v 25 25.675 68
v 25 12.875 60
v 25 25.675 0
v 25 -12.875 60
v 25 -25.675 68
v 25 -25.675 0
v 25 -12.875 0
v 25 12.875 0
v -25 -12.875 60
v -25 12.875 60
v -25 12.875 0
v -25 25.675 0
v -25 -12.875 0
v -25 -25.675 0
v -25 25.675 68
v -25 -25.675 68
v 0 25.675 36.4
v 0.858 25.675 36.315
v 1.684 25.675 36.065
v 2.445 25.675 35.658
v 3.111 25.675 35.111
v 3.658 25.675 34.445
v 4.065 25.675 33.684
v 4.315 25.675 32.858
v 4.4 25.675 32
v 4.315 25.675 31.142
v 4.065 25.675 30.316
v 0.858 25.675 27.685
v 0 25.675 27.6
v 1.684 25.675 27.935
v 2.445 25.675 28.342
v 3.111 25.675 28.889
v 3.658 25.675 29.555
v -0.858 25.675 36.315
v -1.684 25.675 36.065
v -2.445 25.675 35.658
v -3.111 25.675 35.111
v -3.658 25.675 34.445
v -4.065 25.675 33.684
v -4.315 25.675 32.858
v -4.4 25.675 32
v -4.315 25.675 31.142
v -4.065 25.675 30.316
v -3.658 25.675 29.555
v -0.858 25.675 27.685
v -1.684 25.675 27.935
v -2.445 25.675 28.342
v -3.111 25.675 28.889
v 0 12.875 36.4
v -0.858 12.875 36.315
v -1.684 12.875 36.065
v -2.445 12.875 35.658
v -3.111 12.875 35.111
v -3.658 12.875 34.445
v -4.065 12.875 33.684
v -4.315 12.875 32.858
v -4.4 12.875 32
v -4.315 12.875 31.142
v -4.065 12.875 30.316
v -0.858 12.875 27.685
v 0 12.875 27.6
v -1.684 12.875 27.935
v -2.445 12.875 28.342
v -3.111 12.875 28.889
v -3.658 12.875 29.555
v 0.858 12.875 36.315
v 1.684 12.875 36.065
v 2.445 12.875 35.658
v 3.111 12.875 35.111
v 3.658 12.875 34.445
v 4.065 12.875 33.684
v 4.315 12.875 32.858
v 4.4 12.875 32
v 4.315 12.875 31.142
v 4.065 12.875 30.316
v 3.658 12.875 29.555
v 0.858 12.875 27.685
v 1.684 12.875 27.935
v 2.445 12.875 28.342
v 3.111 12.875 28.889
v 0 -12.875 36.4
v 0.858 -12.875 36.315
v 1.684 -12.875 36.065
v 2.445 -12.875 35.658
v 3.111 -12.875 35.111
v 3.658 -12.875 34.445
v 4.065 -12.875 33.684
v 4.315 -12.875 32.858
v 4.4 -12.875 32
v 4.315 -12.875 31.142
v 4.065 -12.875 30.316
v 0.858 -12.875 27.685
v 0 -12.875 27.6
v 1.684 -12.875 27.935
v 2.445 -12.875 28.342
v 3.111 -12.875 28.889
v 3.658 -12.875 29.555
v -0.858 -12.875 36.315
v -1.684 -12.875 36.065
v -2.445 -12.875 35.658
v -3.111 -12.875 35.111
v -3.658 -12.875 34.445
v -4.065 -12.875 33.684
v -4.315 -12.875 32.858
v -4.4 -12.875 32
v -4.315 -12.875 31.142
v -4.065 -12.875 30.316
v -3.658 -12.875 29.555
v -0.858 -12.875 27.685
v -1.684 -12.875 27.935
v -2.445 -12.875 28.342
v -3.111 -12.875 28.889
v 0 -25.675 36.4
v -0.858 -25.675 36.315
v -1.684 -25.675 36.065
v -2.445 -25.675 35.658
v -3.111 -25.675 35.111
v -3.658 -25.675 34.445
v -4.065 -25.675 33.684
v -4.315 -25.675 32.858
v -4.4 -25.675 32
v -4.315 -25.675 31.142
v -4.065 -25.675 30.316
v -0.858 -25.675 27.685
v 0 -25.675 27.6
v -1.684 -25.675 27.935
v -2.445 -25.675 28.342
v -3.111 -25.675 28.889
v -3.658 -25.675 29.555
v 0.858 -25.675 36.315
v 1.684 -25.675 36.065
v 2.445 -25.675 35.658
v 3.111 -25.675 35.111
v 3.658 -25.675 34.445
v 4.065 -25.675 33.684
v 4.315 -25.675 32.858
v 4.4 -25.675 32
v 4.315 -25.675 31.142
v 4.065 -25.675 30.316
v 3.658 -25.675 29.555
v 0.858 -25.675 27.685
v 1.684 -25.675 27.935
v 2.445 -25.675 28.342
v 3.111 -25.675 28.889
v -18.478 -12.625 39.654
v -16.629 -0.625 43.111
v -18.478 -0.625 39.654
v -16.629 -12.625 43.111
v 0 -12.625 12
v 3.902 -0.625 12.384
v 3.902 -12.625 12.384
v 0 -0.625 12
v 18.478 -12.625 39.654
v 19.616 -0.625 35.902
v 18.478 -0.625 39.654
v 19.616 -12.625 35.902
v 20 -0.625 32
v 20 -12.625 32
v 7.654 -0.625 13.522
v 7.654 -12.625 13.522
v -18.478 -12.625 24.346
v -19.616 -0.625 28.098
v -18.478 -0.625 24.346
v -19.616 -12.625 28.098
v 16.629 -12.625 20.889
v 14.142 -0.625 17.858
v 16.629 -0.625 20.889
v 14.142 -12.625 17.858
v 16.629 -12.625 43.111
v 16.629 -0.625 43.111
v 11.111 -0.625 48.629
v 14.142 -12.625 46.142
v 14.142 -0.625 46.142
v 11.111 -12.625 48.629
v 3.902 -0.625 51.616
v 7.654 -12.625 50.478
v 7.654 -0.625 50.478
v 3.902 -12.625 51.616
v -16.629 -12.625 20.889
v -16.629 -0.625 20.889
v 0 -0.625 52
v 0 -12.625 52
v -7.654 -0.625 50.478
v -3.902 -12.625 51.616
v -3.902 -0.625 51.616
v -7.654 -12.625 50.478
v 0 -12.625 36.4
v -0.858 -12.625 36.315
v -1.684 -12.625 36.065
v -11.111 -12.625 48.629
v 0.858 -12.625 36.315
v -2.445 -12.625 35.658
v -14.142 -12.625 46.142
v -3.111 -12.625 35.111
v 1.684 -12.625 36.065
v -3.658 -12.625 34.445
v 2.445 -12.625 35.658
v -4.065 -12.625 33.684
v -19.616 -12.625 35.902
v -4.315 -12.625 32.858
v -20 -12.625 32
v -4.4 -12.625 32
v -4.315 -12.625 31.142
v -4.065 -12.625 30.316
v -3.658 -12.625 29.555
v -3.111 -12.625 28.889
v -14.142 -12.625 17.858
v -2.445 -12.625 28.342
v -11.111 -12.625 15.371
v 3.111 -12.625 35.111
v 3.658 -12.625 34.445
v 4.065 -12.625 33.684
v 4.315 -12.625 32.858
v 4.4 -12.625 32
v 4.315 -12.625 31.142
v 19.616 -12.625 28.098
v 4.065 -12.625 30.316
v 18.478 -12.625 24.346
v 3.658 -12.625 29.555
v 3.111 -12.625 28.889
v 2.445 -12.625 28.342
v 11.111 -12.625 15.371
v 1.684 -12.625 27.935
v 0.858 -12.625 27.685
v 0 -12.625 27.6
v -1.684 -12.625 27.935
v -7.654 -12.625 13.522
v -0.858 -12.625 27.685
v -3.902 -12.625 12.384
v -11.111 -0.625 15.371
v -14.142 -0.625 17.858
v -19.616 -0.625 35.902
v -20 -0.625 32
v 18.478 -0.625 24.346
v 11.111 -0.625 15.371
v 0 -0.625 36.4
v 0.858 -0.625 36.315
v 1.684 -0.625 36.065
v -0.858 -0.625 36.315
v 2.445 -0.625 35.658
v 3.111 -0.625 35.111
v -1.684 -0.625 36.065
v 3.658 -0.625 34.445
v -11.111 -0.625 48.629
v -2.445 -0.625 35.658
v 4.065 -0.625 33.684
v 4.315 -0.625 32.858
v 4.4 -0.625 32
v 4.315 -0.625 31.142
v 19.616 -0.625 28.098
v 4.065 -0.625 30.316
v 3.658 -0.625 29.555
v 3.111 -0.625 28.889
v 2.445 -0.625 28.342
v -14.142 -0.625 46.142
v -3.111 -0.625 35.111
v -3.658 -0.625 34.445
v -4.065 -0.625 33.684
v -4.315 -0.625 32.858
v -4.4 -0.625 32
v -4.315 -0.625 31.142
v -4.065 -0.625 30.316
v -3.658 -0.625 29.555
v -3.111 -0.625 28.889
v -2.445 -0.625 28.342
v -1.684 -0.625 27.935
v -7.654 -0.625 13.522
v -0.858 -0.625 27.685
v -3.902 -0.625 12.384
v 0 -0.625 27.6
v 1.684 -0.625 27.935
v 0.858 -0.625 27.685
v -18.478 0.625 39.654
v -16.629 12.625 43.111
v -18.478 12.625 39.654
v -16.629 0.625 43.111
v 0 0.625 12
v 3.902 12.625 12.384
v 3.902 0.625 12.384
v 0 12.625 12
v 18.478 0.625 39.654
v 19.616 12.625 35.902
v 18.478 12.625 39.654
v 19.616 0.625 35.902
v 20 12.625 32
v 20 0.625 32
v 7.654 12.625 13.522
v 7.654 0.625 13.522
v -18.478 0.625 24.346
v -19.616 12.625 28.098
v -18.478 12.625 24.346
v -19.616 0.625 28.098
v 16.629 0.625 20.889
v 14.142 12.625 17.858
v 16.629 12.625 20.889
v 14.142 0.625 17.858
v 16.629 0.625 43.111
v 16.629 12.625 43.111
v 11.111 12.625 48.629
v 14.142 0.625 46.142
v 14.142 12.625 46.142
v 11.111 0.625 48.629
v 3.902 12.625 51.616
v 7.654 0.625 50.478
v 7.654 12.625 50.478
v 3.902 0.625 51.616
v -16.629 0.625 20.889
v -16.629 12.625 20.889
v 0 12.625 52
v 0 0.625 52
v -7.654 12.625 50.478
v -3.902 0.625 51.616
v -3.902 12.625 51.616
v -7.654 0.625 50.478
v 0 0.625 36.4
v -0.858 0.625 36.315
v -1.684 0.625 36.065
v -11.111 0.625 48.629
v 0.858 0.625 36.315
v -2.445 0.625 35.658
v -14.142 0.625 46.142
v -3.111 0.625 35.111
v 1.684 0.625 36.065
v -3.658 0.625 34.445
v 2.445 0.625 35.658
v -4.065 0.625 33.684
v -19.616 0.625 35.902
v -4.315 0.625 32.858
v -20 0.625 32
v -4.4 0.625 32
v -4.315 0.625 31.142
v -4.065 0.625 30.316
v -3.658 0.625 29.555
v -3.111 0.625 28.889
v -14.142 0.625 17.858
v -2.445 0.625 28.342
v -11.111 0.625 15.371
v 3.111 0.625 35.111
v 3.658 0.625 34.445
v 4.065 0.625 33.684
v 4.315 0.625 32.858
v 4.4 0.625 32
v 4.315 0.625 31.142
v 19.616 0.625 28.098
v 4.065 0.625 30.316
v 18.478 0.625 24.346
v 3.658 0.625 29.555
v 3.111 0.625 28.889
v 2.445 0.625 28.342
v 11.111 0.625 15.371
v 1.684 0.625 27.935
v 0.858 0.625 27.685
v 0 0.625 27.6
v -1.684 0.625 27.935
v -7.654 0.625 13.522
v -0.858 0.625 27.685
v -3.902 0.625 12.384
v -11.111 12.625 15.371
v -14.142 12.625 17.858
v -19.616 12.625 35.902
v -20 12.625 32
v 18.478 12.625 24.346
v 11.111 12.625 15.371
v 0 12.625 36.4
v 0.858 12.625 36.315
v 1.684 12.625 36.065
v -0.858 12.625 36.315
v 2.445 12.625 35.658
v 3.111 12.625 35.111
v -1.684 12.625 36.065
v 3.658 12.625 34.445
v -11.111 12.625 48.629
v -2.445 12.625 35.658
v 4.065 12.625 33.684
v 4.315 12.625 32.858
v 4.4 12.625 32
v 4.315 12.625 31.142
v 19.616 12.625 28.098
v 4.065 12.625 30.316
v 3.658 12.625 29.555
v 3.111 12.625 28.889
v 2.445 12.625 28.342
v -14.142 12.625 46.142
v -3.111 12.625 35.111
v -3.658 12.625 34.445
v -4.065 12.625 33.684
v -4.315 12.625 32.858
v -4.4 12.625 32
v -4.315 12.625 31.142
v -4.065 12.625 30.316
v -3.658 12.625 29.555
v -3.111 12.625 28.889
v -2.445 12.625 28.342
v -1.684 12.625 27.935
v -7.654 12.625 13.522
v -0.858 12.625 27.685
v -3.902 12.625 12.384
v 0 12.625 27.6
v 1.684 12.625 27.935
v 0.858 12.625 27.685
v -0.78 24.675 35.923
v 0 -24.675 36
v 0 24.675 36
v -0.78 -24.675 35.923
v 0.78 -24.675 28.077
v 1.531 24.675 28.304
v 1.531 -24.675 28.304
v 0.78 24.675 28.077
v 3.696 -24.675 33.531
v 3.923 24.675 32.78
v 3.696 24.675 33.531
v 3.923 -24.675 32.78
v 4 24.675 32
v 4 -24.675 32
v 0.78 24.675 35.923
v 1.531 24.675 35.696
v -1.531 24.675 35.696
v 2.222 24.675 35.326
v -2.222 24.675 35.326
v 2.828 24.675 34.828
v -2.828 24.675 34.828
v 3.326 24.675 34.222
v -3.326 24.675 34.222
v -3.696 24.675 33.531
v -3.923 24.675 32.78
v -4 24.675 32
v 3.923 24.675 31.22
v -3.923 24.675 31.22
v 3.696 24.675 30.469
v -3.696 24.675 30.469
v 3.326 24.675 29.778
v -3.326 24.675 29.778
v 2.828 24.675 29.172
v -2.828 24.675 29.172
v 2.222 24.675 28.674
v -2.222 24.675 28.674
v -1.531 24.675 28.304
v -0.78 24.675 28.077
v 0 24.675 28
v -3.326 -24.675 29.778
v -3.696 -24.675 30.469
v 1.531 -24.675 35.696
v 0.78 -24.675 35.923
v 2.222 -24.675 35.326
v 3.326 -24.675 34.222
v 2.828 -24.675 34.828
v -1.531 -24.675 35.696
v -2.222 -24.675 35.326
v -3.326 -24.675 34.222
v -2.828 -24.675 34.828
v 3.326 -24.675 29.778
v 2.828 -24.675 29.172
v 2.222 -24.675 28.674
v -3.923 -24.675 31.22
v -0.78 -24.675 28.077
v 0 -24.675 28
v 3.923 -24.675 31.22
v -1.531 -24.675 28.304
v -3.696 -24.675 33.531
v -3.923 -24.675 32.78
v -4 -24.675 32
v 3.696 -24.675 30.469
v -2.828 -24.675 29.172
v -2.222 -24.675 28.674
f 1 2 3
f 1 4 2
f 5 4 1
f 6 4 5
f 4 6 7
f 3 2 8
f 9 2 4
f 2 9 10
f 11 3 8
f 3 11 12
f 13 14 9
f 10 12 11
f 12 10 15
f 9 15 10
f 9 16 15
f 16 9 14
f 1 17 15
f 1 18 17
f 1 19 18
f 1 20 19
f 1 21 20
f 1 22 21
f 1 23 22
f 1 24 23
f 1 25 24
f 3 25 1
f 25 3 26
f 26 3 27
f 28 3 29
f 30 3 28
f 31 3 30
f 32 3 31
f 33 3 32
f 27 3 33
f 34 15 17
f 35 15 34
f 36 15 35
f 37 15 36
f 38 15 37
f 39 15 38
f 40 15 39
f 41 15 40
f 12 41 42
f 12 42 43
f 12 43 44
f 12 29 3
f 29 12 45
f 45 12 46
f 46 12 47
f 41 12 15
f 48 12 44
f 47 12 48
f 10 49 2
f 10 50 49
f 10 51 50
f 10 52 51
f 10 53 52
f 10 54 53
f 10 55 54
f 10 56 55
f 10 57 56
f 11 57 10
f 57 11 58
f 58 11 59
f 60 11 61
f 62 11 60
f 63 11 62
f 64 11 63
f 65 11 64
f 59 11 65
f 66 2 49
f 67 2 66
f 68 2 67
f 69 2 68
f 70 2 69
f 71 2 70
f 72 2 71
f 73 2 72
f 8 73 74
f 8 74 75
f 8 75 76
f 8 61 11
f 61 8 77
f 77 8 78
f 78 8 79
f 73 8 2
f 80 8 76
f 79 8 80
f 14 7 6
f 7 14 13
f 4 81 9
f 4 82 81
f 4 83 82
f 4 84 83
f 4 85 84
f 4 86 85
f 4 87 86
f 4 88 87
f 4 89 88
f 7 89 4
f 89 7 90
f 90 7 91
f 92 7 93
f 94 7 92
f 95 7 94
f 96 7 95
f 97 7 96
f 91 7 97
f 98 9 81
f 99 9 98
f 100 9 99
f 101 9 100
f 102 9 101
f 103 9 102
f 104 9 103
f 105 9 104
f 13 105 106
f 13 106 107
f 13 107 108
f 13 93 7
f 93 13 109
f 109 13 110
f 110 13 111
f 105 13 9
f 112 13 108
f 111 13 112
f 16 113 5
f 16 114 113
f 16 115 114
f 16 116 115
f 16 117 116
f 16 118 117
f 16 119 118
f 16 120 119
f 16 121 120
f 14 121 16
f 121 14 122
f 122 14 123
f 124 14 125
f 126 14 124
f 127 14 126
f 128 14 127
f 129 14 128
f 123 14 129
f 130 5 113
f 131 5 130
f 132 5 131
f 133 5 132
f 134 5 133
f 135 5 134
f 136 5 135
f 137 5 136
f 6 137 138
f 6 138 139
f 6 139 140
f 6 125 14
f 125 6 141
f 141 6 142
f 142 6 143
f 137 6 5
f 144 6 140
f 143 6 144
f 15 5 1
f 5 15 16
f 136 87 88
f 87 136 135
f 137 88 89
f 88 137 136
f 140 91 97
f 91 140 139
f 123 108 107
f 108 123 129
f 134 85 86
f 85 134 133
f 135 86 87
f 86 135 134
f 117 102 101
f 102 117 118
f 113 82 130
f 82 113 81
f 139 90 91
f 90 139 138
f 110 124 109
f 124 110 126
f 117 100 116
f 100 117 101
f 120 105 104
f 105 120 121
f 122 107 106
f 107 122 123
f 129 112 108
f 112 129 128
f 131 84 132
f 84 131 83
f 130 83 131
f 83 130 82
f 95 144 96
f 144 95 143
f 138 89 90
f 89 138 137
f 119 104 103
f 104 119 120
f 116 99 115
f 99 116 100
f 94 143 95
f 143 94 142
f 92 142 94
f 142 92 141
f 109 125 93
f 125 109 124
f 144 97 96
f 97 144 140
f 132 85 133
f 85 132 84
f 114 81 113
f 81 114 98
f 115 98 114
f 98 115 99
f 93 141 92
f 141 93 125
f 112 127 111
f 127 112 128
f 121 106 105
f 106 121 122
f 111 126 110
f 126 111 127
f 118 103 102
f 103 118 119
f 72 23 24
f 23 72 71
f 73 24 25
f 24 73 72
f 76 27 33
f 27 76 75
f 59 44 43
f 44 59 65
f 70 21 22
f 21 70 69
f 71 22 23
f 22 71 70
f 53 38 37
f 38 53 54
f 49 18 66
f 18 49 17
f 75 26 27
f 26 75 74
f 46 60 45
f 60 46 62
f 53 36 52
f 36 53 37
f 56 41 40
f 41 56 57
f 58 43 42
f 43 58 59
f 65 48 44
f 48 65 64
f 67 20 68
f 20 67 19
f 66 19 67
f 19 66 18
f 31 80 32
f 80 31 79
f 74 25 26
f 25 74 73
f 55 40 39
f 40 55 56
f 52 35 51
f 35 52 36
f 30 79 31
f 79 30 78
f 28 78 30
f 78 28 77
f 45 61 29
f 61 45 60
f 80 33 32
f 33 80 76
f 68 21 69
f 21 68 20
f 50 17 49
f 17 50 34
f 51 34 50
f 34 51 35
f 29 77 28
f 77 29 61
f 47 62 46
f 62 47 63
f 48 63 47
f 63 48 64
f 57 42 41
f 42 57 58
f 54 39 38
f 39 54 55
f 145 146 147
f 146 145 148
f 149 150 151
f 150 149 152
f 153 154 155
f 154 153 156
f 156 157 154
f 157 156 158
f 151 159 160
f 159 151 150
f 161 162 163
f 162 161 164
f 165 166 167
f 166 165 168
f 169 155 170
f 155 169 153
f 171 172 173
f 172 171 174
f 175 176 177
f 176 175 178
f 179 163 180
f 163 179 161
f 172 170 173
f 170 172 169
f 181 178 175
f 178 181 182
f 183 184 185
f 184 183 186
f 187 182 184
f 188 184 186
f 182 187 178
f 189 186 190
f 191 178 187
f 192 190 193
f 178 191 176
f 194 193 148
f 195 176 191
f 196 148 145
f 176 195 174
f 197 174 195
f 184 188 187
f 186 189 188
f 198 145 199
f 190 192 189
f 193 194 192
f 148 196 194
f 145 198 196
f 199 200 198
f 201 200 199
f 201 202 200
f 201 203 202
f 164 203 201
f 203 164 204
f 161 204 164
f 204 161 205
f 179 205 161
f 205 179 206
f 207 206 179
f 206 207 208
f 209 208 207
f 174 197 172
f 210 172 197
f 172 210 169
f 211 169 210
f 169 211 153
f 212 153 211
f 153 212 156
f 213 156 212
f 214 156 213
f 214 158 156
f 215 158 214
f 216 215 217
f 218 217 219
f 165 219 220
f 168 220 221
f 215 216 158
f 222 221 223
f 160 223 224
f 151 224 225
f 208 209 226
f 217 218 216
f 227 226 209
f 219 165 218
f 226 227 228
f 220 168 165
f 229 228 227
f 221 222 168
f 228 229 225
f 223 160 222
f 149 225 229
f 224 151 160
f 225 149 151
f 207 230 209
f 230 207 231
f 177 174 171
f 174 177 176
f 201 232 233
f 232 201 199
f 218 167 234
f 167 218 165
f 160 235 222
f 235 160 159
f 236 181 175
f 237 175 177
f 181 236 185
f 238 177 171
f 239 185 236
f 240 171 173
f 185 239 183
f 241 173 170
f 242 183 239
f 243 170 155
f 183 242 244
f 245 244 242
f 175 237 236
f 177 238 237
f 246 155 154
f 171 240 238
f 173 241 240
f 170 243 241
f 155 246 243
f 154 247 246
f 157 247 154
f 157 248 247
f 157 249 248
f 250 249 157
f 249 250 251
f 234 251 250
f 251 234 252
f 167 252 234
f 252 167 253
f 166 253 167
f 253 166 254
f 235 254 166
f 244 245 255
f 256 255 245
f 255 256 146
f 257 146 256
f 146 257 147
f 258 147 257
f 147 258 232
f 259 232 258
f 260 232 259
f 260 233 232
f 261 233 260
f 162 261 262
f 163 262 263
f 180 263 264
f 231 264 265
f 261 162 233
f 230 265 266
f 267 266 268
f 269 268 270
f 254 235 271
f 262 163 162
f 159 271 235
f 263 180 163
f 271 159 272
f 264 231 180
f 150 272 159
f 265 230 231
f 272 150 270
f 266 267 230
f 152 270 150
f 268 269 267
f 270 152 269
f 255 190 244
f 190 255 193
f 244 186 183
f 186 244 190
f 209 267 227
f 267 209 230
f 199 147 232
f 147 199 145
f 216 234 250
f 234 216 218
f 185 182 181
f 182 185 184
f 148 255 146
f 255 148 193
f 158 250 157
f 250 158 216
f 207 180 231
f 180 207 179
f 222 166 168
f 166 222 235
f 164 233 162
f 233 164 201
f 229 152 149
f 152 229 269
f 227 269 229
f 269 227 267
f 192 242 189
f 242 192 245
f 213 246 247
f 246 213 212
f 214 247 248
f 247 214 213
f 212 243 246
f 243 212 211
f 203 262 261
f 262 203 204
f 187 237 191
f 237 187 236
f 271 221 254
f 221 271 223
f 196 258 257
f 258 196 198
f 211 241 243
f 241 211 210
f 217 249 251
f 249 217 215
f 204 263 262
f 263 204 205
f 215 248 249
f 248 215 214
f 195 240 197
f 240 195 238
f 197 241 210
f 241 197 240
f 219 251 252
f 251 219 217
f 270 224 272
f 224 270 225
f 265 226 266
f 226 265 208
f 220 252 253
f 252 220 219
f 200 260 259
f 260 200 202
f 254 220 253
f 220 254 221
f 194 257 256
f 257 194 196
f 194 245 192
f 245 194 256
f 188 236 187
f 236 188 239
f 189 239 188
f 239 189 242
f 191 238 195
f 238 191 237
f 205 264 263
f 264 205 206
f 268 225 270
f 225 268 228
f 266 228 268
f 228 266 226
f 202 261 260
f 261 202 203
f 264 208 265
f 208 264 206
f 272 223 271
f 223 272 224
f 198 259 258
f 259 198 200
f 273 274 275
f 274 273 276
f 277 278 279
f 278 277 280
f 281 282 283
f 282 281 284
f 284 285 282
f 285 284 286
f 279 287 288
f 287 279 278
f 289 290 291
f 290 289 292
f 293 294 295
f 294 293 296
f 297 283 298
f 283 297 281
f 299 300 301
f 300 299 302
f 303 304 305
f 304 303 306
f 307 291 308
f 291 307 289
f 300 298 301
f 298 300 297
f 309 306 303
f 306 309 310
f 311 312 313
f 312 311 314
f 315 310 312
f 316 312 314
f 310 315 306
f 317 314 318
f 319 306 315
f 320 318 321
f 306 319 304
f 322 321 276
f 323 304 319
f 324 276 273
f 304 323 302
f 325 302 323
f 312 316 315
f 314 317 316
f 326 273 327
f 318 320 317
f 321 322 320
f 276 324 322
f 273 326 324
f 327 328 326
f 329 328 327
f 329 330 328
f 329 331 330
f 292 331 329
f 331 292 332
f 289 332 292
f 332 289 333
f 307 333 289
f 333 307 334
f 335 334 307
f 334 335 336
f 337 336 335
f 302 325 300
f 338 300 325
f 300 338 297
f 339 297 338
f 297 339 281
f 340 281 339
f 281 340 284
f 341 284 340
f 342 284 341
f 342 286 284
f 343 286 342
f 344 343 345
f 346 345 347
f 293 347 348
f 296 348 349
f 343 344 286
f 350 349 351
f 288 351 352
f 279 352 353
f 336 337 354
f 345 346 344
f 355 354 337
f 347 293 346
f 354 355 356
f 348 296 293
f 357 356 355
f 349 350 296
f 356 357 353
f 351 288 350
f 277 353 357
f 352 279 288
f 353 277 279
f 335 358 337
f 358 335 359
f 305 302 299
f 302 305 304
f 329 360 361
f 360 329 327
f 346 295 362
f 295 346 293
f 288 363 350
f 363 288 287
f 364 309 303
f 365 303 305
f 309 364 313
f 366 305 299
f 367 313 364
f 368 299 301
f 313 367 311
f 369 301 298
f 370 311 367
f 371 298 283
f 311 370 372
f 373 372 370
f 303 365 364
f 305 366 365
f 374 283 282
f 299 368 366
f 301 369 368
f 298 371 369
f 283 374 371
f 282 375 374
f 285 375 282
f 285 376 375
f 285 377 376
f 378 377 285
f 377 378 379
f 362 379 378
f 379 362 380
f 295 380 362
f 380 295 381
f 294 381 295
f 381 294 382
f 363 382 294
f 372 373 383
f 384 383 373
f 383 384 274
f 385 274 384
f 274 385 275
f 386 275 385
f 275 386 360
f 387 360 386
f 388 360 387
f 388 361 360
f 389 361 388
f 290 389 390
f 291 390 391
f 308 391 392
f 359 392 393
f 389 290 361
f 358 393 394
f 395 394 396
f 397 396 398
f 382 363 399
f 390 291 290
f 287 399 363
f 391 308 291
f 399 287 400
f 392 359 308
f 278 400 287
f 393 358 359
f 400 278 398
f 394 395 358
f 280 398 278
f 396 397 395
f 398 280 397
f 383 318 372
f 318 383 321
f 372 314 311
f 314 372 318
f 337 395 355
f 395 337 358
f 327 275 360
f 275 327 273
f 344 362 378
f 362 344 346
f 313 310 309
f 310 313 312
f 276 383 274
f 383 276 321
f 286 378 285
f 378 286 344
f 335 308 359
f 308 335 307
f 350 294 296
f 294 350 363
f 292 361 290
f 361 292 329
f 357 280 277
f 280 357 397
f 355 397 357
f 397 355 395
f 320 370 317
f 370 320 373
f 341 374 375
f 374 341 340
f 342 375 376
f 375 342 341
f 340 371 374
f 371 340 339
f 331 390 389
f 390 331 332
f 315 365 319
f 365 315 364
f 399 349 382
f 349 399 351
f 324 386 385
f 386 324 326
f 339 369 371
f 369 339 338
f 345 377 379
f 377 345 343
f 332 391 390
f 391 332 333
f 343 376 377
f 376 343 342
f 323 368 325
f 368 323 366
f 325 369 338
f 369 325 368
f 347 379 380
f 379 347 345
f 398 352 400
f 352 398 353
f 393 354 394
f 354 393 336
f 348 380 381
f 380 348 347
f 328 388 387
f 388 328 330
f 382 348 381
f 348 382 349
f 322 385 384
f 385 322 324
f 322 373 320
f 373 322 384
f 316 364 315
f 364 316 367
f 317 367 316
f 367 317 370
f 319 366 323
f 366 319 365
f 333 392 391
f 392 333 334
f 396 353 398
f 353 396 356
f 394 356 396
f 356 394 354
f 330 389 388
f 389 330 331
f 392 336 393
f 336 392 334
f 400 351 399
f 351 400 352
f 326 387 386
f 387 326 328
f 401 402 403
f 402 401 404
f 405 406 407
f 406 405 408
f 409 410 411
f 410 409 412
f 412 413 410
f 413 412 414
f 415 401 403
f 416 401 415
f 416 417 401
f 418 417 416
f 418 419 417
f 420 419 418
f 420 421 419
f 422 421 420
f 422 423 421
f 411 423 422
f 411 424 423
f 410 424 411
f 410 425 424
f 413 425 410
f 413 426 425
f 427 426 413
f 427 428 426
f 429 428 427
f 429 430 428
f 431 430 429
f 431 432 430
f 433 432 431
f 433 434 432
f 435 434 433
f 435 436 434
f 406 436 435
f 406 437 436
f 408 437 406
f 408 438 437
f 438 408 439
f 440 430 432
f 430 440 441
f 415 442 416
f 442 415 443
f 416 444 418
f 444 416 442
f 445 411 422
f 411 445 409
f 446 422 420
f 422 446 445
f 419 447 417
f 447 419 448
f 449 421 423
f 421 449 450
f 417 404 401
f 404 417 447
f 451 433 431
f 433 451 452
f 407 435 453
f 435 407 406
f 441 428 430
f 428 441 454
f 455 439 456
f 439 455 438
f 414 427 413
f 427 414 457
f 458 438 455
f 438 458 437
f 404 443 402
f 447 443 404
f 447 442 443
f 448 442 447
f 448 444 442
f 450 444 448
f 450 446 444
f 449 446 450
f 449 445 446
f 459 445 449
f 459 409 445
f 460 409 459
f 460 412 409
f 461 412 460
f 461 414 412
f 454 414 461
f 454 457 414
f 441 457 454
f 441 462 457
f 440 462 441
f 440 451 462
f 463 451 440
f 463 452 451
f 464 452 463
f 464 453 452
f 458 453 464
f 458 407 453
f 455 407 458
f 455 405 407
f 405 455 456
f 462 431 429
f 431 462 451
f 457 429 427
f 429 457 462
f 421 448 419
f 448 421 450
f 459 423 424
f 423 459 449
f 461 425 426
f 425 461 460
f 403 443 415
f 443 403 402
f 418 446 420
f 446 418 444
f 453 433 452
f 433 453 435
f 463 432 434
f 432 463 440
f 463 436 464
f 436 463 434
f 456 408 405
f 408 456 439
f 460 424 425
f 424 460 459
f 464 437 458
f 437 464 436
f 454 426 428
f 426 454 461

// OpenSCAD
$fn = 32;

// ------------------------------------------------------------------------
// Trolley wheel set: wheels d40, fork 60 mm tall
// Every part is its own module, assembly() places every instance.
// ------------------------------------------------------------------------

// --- part 1 ---
module trolley_fork() {
  difference() {
    union() {
      translate([-25, 12.875, 0]) cube([50, 12.8, 60]);
      translate([-25, -25.675, 0]) cube([50, 12.8, 60]);
      translate([-25, -25.675, 60]) cube([50, 51.35, 8]);
    }
    translate([0, -19.275, 32]) rotate([90, 0, 0]) cylinder(h = 14.8, d = 8.8, center = true);
    translate([0, 19.275, 32]) rotate([90, 0, 0]) cylinder(h = 14.8, d = 8.8, center = true);
  }
}

// --- part 2 ---
module trolley_wheel() {
  difference() {
      translate([0, 0, 0]) cylinder(h = 12, d = 40);
      translate([0, 0, -1]) cylinder(h = 14, d = 8.8);
    }
}

// --- part 3 ---
module trolley_axle() {
  translate([0, 0, -24.675]) cylinder(h = 49.35, d = 8);
}

// --- assembly ---
module assembly() {
  color([0.80, 0.24, 0.20]) translate([0, 0, 0]) rotate([0, 0, 0]) trolley_fork();
  color([0.20, 0.45, 0.75]) translate([0, -0.625, 32]) rotate([90, 0, 0]) trolley_wheel();
  color([0.25, 0.62, 0.32]) translate([0, 12.625, 32]) rotate([90, 0, 0]) trolley_wheel();
  color([0.92, 0.70, 0.18]) translate([0, 0, 32]) rotate([90, 0, 0]) trolley_axle();
}

assembly();
